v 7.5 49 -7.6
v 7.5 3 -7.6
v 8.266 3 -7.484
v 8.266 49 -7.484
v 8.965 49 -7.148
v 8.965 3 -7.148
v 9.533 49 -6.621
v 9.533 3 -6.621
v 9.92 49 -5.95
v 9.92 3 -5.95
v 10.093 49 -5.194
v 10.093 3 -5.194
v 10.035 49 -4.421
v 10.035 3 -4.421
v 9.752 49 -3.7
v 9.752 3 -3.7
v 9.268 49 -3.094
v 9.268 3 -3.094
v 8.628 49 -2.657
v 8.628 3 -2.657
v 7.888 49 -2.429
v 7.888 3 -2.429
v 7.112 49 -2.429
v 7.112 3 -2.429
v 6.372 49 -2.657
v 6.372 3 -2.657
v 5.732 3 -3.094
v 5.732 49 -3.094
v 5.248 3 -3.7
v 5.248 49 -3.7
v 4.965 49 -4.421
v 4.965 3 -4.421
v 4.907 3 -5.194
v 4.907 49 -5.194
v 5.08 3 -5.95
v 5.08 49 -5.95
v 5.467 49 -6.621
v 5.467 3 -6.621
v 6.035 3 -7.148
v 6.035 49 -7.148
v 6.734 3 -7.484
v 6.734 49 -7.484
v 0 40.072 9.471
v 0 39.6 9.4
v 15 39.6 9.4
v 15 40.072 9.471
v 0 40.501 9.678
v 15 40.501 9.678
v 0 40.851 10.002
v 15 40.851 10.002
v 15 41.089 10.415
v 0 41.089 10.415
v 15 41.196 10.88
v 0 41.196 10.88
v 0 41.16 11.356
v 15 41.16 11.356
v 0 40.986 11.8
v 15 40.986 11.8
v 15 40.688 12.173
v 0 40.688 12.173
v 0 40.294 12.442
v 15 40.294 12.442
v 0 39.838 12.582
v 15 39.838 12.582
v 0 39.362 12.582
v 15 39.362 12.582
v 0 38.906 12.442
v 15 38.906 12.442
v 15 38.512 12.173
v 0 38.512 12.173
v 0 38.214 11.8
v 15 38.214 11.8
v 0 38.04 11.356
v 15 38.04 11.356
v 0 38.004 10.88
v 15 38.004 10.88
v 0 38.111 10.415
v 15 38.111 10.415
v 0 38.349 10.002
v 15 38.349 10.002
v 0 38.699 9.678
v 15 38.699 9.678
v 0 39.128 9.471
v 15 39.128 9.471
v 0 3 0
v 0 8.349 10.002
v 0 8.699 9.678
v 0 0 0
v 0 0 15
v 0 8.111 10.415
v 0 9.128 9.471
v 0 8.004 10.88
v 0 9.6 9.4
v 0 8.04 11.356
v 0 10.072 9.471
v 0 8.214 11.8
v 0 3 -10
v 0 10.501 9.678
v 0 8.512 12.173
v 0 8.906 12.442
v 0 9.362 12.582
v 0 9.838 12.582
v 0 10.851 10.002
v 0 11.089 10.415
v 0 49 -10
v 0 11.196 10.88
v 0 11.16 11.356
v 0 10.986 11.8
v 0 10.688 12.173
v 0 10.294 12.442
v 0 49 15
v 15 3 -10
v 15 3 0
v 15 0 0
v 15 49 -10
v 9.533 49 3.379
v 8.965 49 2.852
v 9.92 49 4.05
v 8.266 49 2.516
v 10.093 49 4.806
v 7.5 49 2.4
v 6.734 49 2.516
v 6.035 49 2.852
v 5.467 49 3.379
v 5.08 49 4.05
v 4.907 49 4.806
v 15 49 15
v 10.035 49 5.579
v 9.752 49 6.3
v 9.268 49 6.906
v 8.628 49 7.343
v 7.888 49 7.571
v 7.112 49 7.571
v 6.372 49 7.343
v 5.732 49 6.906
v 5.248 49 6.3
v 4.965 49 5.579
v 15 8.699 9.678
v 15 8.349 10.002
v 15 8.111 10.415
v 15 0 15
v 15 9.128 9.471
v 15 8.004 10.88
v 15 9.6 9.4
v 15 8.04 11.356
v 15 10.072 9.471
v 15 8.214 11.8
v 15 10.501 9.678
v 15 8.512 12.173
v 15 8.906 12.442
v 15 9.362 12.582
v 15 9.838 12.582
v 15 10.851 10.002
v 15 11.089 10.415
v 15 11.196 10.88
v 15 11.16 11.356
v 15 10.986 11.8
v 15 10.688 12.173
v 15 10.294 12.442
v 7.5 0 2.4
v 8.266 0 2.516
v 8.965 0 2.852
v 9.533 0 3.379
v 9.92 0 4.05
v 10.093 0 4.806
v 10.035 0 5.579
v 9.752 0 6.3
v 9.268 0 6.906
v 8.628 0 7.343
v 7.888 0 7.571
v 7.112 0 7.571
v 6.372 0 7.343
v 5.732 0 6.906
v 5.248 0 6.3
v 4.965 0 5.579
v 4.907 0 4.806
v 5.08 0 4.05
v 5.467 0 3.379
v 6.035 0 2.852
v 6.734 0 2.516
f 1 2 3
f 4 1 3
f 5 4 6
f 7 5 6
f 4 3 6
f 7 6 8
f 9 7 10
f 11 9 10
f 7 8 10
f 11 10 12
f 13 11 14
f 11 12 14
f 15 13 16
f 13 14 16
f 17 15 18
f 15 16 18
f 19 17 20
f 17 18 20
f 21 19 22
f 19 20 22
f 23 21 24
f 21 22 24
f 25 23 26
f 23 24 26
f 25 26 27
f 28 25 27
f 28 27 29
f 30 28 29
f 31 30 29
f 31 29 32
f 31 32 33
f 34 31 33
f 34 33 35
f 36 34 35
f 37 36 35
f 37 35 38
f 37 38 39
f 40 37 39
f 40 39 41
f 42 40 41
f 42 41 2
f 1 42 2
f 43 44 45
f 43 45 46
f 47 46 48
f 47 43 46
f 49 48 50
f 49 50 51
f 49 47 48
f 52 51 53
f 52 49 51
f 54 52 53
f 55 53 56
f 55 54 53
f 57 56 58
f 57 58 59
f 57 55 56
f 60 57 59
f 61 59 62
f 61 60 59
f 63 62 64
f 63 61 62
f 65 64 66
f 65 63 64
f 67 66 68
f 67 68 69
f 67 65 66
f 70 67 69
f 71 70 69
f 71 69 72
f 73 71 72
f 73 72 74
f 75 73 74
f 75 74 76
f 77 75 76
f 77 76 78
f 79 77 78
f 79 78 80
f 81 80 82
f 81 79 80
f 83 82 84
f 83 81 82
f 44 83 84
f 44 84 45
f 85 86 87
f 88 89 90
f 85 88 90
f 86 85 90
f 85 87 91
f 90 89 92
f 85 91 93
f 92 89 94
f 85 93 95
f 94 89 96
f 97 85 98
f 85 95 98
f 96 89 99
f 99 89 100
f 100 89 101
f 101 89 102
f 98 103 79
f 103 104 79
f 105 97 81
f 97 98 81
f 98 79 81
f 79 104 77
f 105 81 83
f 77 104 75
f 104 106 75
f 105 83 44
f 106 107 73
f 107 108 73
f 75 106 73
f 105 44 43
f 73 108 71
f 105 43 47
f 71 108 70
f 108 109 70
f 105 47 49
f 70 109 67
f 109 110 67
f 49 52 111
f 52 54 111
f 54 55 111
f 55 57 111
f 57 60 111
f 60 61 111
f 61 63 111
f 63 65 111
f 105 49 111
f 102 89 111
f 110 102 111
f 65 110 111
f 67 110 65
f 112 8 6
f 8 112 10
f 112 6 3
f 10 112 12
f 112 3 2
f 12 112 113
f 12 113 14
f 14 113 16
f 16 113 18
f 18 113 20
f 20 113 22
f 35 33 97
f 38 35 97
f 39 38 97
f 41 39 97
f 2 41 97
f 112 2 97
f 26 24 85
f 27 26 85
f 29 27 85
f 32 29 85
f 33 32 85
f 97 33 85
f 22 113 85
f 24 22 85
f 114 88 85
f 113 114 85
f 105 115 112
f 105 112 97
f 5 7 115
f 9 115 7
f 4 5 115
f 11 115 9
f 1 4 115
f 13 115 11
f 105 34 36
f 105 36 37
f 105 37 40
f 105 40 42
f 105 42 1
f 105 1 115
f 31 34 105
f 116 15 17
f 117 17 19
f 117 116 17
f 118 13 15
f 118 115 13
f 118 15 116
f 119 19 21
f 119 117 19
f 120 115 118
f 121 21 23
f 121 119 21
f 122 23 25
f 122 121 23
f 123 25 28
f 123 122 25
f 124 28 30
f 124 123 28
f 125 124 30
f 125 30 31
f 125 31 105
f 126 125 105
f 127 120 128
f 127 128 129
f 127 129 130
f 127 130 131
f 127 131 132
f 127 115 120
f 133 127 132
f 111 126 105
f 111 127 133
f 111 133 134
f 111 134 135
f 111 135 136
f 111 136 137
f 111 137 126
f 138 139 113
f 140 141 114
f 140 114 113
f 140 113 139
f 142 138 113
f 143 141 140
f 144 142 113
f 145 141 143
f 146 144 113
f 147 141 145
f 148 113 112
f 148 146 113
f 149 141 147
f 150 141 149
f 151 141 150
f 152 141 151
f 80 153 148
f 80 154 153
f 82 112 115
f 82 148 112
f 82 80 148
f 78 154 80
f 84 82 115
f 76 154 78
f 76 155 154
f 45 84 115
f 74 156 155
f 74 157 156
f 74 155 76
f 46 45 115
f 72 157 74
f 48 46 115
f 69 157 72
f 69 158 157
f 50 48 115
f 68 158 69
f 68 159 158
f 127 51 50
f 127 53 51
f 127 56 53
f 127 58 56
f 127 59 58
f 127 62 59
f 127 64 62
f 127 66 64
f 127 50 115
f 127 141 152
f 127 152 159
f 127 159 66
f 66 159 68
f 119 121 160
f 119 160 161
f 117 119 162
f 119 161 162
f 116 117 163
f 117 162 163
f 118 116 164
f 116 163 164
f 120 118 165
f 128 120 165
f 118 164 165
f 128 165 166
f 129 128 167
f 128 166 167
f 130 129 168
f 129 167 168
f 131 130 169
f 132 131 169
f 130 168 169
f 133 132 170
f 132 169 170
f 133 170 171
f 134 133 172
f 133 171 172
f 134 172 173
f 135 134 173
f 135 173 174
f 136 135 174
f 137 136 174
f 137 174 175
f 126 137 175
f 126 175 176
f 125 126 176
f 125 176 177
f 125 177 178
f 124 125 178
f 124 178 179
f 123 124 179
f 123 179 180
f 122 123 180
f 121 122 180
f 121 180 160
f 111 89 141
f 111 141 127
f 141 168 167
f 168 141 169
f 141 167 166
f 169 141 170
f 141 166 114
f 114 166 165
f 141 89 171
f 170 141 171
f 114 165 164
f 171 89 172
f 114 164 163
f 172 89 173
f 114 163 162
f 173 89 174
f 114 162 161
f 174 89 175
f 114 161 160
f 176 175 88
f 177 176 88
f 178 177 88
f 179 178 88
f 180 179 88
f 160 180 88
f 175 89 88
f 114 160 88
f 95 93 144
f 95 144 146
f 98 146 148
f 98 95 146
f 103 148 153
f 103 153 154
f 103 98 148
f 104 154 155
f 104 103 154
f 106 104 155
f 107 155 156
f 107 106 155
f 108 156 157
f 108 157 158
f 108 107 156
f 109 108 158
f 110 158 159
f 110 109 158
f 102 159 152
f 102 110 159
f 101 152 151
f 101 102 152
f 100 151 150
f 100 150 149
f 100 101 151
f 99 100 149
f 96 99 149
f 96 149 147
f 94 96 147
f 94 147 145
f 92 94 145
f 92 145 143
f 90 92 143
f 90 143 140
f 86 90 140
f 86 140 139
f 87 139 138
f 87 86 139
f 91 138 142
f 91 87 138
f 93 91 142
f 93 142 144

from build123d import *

# Parameters (mm, degrees)
SKETCH1_W           = 15
SKETCH1_H           = 49
SKETCH1_R           = 1.6
BOSS_EXTRUDE1_DEPTH = 15
SKETCH2_R           = 2.6
CUT_EXTRUDE1_DEPTH  = 54.394756297
SKETCH5_W           = 15
SKETCH5_H           = 46
BOSS_EXTRUDE3_DEPTH = 10
SKETCH6_R           = 2.6
CUT_EXTRUDE2_DEPTH  = 51.655700568


with BuildPart() as part:
    # Sketch1 → Boss-Extrude1 (new body)
    with BuildSketch(Plane(origin=(0, 0, 0), x_dir=(0, 0, -1), z_dir=(1, 0, 0))):
        with Locations((-7.5, 24.5)):
            Rectangle(SKETCH1_W, SKETCH1_H)
        with Locations((-11, 39.6)):
            Circle(SKETCH1_R, mode=Mode.SUBTRACT)
        with Locations((-11, 9.6)):
            Circle(SKETCH1_R, mode=Mode.SUBTRACT)
    extrude(amount=BOSS_EXTRUDE1_DEPTH)

    # Sketch2 → Cut-Extrude1 (cut, through all)
    with BuildSketch(Plane.XZ):
        with Locations(Location((7.5, 5, 0), (0, 0, 270))):
            Circle(SKETCH2_R)
    extrude(amount=-CUT_EXTRUDE1_DEPTH, mode=Mode.SUBTRACT)

    # Sketch5 → Boss-Extrude3 (add)
    with BuildSketch(Plane(origin=(0, 0, 0), x_dir=(-1, 0, 0), z_dir=(0, 0, -1))):
        with Locations((-7.5, 26)):
            Rectangle(SKETCH5_W, SKETCH5_H)
    extrude(amount=BOSS_EXTRUDE3_DEPTH)

    # Sketch6 → Cut-Extrude2 (cut, through all)
    with BuildSketch(Plane.XZ.offset(-3)):
        with Locations(Location((7.5, -5, 0), (0, 0, 270))):
            Circle(SKETCH6_R)
    extrude(amount=-CUT_EXTRUDE2_DEPTH, mode=Mode.SUBTRACT)


solid = part.part
